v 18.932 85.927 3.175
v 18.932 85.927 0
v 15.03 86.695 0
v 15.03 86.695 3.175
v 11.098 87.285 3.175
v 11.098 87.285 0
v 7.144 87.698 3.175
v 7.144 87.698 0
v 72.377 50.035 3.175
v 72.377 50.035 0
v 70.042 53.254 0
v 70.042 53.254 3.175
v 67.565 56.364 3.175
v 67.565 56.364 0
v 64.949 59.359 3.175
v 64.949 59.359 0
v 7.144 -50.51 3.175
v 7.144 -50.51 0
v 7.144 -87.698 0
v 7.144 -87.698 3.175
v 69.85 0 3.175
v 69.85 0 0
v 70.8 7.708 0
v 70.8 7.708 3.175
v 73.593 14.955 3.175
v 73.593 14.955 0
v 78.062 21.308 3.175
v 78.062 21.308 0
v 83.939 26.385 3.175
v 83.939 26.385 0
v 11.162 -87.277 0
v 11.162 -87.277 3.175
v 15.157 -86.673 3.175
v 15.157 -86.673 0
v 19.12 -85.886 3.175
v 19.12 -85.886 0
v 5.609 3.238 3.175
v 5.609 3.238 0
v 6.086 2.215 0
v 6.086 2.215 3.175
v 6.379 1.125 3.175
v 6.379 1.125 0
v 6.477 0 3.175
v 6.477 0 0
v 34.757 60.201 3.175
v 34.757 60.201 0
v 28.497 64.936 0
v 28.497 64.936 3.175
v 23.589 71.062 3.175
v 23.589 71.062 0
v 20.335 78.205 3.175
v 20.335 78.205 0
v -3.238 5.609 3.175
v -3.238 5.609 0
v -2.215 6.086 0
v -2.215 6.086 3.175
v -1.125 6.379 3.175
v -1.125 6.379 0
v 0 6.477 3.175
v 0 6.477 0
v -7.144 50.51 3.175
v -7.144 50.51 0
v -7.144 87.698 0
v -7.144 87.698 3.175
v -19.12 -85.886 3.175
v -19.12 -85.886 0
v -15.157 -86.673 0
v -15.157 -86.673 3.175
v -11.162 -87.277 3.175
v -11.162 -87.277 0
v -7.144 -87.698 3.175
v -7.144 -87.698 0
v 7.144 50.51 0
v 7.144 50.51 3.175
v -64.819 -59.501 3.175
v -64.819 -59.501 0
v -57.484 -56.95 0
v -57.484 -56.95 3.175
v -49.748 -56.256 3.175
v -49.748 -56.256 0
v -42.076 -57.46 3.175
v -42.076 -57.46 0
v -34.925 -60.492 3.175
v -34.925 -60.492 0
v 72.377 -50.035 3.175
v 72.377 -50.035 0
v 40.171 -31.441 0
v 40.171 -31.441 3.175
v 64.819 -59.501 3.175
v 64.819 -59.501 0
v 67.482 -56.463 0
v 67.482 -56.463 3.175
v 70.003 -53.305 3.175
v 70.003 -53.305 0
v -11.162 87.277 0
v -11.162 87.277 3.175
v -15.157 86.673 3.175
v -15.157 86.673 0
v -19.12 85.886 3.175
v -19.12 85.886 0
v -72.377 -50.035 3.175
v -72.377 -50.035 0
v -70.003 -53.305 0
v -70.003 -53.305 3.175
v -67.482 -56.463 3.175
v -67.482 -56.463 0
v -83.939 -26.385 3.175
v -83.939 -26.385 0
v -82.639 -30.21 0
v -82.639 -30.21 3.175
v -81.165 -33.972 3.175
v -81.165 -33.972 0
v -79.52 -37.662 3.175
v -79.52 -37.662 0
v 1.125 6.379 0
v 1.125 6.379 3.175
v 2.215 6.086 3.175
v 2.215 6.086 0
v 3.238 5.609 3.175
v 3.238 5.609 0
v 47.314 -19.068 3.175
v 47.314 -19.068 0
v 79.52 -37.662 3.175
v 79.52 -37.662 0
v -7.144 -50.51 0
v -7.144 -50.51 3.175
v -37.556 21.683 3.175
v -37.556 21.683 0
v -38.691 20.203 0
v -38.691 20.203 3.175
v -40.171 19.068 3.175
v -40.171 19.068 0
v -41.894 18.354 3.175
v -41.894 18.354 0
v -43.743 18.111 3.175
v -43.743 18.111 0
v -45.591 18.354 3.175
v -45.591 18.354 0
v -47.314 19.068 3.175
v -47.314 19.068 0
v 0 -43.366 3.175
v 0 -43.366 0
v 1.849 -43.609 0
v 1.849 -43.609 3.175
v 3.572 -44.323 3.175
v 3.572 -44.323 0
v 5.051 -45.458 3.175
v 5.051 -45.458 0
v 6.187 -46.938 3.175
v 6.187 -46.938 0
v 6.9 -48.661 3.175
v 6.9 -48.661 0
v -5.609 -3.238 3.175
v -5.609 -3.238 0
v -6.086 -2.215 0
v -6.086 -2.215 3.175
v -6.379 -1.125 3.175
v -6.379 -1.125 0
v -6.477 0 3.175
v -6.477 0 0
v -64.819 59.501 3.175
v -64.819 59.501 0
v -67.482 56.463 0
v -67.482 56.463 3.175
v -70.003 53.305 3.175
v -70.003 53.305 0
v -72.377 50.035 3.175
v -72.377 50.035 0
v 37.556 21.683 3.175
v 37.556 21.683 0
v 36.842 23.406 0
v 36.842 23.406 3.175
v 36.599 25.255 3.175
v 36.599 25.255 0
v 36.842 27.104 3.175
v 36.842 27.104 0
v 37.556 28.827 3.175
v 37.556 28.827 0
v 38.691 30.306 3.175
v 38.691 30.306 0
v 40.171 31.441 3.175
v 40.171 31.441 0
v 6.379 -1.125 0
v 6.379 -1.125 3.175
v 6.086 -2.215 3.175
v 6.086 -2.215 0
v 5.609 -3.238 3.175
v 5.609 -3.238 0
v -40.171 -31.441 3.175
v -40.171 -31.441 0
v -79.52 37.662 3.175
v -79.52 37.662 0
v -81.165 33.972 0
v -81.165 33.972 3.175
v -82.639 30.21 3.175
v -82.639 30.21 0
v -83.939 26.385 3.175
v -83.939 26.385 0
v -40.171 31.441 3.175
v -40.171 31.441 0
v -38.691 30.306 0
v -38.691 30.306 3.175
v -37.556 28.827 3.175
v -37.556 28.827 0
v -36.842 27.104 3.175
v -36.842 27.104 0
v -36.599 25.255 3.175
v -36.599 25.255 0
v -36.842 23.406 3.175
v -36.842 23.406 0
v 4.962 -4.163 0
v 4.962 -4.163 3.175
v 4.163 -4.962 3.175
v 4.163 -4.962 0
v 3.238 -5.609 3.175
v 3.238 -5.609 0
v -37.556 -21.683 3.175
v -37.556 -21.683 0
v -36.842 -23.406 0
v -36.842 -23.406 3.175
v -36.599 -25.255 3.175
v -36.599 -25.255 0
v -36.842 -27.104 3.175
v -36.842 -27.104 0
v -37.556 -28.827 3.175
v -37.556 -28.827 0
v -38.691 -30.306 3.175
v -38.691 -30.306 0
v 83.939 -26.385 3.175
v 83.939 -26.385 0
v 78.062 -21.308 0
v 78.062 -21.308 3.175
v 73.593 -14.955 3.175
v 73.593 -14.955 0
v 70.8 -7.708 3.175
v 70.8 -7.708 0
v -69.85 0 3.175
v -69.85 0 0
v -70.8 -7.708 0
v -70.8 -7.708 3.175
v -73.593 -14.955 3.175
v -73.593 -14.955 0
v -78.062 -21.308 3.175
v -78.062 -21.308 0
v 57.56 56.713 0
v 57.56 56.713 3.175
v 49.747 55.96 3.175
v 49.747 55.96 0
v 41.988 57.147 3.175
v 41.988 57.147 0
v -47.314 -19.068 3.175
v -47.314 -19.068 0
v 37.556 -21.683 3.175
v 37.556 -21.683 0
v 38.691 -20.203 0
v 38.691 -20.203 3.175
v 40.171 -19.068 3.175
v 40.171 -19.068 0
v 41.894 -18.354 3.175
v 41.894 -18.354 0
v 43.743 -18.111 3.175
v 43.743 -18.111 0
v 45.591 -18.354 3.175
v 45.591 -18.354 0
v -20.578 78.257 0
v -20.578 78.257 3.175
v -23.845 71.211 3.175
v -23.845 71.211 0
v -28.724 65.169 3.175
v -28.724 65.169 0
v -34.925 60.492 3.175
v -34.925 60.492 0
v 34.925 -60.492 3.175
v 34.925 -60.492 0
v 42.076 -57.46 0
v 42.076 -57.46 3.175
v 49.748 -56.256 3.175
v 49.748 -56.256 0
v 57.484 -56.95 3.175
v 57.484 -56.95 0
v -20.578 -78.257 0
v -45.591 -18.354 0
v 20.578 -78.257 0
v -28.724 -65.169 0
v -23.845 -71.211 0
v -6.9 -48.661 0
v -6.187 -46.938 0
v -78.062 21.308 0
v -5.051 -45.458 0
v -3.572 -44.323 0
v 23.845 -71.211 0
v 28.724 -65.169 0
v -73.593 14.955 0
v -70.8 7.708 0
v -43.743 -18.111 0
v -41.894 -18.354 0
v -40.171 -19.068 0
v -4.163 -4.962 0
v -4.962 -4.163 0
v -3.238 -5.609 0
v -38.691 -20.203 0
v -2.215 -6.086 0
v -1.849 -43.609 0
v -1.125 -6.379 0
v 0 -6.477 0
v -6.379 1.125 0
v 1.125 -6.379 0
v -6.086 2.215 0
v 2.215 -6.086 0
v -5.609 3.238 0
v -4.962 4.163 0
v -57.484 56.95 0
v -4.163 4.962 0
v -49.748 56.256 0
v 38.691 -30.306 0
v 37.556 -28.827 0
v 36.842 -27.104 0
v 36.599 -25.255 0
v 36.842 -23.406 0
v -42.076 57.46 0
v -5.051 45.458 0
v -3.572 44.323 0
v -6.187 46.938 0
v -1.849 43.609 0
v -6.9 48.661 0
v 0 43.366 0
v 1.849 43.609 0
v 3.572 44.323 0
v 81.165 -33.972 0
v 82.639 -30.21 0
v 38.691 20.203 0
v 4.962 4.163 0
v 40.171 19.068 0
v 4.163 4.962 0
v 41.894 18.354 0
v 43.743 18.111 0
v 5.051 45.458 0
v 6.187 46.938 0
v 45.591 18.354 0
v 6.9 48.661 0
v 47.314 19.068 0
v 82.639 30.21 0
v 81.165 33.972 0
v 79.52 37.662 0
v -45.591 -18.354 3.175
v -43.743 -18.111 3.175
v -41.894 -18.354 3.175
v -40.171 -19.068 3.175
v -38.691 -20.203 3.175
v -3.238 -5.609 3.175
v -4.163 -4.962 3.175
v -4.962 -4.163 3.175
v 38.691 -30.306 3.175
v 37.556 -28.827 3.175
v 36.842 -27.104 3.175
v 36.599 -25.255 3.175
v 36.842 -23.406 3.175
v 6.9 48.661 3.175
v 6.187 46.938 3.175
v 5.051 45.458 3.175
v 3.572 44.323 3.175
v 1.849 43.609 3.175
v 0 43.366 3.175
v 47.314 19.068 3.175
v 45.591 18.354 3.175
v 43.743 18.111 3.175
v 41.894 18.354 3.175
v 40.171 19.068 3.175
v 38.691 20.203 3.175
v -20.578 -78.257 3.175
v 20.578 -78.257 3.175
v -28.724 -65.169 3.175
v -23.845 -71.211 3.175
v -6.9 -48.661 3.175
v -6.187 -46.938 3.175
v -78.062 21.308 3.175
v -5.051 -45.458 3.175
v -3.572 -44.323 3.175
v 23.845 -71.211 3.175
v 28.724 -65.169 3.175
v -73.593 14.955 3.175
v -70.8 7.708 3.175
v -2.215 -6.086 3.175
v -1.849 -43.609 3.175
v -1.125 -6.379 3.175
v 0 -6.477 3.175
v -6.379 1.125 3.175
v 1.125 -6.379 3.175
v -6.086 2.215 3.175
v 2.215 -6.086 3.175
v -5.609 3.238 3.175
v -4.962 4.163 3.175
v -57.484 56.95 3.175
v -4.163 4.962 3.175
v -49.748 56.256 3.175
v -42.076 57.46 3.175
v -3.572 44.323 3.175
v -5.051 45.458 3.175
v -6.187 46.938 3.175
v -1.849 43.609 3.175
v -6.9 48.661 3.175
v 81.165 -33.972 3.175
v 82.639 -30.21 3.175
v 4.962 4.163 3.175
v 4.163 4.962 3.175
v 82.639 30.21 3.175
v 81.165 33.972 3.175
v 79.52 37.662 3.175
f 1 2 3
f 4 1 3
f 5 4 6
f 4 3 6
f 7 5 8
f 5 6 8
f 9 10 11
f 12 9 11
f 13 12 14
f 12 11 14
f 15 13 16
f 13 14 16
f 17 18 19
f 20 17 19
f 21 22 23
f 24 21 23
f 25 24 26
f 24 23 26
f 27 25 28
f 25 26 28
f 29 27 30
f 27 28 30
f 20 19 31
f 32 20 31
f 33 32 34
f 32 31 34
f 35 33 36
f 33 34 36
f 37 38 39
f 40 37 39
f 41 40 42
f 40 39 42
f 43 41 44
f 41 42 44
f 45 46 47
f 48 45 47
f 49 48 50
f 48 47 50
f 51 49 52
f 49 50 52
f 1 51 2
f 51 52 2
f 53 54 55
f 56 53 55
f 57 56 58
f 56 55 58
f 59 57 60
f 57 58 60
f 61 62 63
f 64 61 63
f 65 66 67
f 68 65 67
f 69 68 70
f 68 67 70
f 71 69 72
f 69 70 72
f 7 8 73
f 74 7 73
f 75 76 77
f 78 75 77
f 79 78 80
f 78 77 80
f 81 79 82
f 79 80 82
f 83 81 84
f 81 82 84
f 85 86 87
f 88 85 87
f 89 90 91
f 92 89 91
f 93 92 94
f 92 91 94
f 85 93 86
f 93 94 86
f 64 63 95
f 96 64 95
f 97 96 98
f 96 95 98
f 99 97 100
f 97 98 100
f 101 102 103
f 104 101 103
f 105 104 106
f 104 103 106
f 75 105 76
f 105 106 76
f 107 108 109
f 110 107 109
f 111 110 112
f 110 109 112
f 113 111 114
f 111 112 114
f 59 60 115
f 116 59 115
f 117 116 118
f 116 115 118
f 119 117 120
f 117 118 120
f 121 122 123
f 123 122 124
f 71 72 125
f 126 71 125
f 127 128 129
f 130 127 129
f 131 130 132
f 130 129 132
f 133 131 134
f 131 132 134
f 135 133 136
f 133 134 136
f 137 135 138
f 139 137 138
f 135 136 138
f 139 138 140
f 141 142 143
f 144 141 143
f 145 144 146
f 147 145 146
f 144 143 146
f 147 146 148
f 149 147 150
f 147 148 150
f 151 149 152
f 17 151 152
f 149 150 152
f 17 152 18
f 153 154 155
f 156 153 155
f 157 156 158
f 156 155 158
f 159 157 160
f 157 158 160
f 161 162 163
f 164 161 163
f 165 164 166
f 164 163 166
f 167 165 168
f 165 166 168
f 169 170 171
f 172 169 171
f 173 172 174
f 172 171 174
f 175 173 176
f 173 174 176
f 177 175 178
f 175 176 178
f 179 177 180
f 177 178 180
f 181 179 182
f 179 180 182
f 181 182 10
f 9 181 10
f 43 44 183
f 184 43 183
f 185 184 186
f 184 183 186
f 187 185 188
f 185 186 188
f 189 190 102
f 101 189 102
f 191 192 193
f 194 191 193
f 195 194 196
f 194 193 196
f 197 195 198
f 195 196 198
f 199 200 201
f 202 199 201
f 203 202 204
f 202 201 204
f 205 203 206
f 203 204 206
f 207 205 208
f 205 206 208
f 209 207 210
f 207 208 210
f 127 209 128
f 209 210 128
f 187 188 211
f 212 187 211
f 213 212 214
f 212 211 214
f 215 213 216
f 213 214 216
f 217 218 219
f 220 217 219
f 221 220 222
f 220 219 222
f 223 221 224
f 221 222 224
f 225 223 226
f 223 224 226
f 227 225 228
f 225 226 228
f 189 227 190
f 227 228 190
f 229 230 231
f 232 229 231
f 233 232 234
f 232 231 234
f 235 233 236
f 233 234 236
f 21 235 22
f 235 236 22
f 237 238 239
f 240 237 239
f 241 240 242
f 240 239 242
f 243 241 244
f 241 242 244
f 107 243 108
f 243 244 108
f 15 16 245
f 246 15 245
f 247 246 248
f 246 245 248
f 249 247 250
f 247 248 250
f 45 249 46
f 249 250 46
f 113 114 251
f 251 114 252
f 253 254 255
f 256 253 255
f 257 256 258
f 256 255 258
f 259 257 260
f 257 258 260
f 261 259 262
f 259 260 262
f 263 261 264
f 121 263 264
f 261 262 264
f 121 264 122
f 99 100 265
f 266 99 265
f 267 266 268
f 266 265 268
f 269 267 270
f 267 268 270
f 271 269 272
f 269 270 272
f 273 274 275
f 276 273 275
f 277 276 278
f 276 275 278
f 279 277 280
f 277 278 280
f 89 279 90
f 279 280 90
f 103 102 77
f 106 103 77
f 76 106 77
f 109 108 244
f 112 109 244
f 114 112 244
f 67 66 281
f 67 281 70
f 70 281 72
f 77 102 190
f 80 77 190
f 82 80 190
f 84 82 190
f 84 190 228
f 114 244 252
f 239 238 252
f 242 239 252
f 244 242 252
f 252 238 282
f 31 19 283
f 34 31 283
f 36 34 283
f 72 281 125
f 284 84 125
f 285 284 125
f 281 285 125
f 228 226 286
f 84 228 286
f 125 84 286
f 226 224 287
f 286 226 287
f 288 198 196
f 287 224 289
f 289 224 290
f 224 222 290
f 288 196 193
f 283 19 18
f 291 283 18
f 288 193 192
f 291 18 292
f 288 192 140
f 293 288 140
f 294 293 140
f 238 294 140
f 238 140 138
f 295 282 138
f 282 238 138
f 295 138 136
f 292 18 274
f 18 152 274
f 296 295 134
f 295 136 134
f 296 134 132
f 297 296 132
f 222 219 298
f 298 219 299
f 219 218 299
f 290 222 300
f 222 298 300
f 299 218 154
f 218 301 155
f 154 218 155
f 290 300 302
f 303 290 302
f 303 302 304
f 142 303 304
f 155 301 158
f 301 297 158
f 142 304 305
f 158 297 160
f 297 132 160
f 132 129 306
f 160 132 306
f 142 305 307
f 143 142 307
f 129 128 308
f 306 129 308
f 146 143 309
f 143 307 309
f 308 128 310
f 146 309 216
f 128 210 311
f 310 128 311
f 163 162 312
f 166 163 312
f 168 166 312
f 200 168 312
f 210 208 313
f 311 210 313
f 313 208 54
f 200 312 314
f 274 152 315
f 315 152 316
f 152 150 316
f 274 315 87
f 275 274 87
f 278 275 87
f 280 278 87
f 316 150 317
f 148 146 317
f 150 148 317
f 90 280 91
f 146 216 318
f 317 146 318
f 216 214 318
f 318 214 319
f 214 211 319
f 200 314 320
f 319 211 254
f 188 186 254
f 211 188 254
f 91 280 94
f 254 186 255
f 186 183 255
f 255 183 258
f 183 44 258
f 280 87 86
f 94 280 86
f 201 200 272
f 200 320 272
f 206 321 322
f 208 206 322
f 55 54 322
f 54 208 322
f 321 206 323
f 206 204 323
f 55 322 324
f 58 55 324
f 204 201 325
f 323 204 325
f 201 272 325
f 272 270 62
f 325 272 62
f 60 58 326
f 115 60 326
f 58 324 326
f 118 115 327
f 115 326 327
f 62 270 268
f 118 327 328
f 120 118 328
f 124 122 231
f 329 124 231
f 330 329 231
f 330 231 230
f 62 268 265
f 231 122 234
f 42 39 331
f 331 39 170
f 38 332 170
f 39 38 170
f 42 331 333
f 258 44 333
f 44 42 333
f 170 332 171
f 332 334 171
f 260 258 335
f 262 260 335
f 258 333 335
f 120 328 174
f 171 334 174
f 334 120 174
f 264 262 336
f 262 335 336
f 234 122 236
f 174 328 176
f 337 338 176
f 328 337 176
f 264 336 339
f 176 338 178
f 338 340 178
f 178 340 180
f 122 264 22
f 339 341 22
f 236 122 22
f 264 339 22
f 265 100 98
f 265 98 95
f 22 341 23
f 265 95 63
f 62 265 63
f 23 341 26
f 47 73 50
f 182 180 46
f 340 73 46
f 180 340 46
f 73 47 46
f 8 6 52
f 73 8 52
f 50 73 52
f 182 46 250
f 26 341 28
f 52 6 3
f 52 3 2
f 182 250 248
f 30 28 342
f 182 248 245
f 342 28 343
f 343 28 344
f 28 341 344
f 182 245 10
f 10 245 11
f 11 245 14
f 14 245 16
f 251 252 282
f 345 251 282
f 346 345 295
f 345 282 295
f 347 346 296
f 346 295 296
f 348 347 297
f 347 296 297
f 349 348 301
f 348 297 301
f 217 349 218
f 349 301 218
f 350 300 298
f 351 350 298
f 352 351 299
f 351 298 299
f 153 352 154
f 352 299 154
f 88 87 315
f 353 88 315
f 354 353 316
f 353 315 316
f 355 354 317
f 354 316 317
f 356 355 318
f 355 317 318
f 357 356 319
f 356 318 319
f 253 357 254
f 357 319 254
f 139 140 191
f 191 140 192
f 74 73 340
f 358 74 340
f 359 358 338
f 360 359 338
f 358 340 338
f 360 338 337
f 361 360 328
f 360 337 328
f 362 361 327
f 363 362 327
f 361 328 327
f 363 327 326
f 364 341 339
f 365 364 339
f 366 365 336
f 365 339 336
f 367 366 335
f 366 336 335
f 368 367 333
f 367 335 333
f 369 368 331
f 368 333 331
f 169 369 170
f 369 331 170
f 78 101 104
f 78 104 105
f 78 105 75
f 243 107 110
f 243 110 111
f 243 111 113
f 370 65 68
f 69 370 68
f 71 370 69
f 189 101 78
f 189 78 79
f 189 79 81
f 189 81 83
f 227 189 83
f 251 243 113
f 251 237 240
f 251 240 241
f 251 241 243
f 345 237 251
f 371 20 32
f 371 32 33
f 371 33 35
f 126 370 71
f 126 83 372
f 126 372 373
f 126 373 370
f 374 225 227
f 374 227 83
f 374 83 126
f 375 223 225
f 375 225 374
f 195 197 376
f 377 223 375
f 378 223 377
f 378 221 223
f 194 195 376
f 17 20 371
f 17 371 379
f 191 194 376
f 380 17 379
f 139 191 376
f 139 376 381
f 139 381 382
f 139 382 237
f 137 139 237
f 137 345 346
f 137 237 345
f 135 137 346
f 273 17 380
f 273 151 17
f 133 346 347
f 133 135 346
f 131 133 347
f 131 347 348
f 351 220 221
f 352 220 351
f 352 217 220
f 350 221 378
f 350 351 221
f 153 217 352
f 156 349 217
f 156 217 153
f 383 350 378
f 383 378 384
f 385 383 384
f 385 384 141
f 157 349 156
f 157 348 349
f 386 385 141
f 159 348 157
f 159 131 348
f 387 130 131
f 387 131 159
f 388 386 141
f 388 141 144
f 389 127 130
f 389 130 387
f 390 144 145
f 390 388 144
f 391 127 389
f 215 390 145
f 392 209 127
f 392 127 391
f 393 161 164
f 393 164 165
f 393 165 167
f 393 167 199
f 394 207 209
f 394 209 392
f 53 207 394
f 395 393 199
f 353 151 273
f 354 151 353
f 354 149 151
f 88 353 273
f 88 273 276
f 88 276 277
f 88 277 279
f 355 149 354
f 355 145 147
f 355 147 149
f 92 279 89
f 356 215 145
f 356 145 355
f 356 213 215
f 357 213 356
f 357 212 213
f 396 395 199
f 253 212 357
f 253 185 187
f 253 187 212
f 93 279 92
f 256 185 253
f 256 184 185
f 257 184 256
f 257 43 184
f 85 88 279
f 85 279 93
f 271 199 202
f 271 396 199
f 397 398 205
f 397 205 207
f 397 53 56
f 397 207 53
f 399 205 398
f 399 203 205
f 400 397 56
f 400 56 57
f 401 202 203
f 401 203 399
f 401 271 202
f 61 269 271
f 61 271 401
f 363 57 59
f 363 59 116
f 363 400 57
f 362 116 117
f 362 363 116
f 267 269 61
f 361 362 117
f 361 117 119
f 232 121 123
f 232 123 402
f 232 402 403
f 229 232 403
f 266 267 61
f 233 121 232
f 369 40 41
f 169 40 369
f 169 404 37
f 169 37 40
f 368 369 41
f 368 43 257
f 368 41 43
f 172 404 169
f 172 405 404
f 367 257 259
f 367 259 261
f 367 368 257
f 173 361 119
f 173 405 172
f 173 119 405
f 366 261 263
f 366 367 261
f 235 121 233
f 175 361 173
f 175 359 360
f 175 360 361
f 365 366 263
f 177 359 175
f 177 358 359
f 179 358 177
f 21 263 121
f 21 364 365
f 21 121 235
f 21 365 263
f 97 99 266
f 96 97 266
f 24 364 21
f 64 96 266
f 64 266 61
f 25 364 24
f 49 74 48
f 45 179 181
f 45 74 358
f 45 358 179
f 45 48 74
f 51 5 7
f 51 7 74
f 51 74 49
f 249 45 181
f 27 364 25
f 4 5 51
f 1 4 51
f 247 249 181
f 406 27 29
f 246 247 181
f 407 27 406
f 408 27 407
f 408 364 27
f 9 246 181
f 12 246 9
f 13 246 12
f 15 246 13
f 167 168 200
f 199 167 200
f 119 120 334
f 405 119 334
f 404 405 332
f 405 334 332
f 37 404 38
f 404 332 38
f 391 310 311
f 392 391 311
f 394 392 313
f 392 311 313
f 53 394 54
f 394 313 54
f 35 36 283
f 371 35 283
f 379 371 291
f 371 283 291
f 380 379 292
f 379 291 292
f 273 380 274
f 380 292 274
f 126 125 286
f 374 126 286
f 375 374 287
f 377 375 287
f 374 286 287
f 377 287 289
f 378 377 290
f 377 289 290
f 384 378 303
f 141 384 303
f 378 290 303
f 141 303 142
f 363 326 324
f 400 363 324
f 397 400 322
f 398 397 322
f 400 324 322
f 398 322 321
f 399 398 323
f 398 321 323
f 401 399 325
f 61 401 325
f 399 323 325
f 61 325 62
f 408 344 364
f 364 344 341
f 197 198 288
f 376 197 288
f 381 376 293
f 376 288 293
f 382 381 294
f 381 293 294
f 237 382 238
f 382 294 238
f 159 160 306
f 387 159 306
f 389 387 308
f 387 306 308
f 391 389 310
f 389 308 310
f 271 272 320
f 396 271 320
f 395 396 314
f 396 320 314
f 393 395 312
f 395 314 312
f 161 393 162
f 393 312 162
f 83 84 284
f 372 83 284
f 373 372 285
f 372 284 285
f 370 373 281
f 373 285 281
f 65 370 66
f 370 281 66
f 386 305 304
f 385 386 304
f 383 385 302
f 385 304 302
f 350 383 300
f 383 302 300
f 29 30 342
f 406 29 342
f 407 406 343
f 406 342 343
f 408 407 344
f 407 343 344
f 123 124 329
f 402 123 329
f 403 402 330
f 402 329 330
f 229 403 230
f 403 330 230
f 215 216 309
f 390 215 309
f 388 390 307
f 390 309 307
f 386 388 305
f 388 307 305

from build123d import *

# Parameters (mm, degrees)
F1_DEPTH = 3.175


with BuildPart() as f1:
    # F0 (on Top) → F1 (new body)
    with BuildSketch(Plane.XY):
        with BuildLine():
            Line((0, 6.477), (0, 43.36577))
            ThreePointArc((0, 43.36577), (-5.051394, 45.458126), (-7.14375, 50.50952))
            Line((-7.14375, 50.50952), (-7.14375, 87.69766))
            ThreePointArc((-7.14375, 87.69766), (-13.162923, 86.99799), (-19.119664, 85.885687))
            ThreePointArc((-19.119664, 85.885687), (-23.844664, 71.210965), (-34.924976, 60.491833))
            Line((-34.924976, 60.491833), (-3.2385, 5.609247))
            ThreePointArc((-3.2385, 5.609247), (-1.676371, 6.256302), (0, 6.477))
        make_face()
        with BuildLine():
            ThreePointArc((-5.609247, 3.2385), (-4.579931, 4.579931), (-3.2385, 5.609247))
            Line((-3.2385, 5.609247), (-34.924976, 60.491833))
            ThreePointArc((-34.924976, 60.491833), (-49.748173, 56.255567), (-64.819355, 59.500958))
            ThreePointArc((-64.819355, 59.500958), (-68.761008, 54.898421), (-72.376527, 50.035499))
            Line((-72.376527, 50.035499), (-40.170653, 31.441429))
            ThreePointArc((-40.170653, 31.441429), (-36.842195, 27.103699), (-37.555859, 21.682885))
            Line((-37.555859, 21.682885), (-5.609247, 3.2385))
        make_face()
        with BuildLine():
            ThreePointArc((-6.477, 0), (-6.256302, 1.676371), (-5.609247, 3.2385))
            Line((-5.609247, 3.2385), (-37.555859, 21.682885))
            ThreePointArc((-37.555859, 21.682885), (-41.893589, 18.354428), (-47.314403, 19.068091))
            Line((-47.314403, 19.068091), (-79.520277, 37.662161))
            ThreePointArc((-79.520277, 37.662161), (-81.923931, 32.099569), (-83.939019, 26.384729))
            ThreePointArc((-83.939019, 26.384729), (-73.592836, 14.955398), (-69.849953, 0))
            Line((-69.849953, 0), (-6.477, 0))
        make_face()
        with BuildLine():
            ThreePointArc((-5.609247, -3.2385), (-6.256302, -1.676371), (-6.477, 0))
            Line((-6.477, 0), (-69.849953, 0))
            ThreePointArc((-69.849953, 0), (-73.592836, -14.955398), (-83.939019, -26.384729))
            ThreePointArc((-83.939019, -26.384729), (-81.923931, -32.099569), (-79.520277, -37.662161))
            Line((-79.520277, -37.662161), (-47.314403, -19.068091))
            ThreePointArc((-47.314403, -19.068091), (-41.893589, -18.354428), (-37.555859, -21.682885))
            Line((-37.555859, -21.682885), (-5.609247, -3.2385))
        make_face()
        with BuildLine():
            ThreePointArc((-3.2385, -5.609247), (-4.579931, -4.579931), (-5.609247, -3.2385))
            Line((-5.609247, -3.2385), (-37.555859, -21.682885))
            ThreePointArc((-37.555859, -21.682885), (-36.842195, -27.103699), (-40.170653, -31.441429))
            Line((-40.170653, -31.441429), (-72.376527, -50.035499))
            ThreePointArc((-72.376527, -50.035499), (-68.761008, -54.898421), (-64.819355, -59.500958))
            ThreePointArc((-64.819355, -59.500958), (-49.748173, -56.255567), (-34.924976, -60.491833))
            Line((-34.924976, -60.491833), (-3.2385, -5.609247))
        make_face()
        with BuildLine():
            Line((0, -43.36577), (0, -6.477))
            ThreePointArc((0, -6.477), (-1.676371, -6.256302), (-3.2385, -5.609247))
            Line((-3.2385, -5.609247), (-34.924976, -60.491833))
            ThreePointArc((-34.924976, -60.491833), (-23.844664, -71.210965), (-19.119664, -85.885687))
            ThreePointArc((-19.119664, -85.885687), (-13.162923, -86.99799), (-7.14375, -87.69766))
            Line((-7.14375, -87.69766), (-7.14375, -50.50952))
            ThreePointArc((-7.14375, -50.50952), (-5.051394, -45.458126), (0, -43.36577))
        make_face()
        with BuildLine():
            Line((34.924976, -60.491833), (3.2385, -5.609247))
            ThreePointArc((3.2385, -5.609247), (1.676371, -6.256302), (0, -6.477))
            Line((0, -6.477), (0, -43.36577))
            ThreePointArc((0, -43.36577), (5.051394, -45.458126), (7.14375, -50.50952))
            Line((7.14375, -50.50952), (7.14375, -87.69766))
            ThreePointArc((7.14375, -87.69766), (13.162923, -86.99799), (19.119664, -85.885687))
            ThreePointArc((19.119664, -85.885687), (23.844664, -71.210965), (34.924976, -60.491833))
        make_face()
        with BuildLine():
            Line((37.555859, -21.682885), (5.609247, -3.2385))
            ThreePointArc((5.609247, -3.2385), (4.579931, -4.579931), (3.2385, -5.609247))
            Line((3.2385, -5.609247), (34.924976, -60.491833))
            ThreePointArc((34.924976, -60.491833), (49.748173, -56.255567), (64.819355, -59.500958))
            ThreePointArc((64.819355, -59.500958), (68.761008, -54.898421), (72.376527, -50.035499))
            Line((72.376527, -50.035499), (40.170653, -31.441429))
            ThreePointArc((40.170653, -31.441429), (36.842195, -27.103699), (37.555859, -21.682885))
        make_face()
        with BuildLine():
            Line((69.849953, 0), (6.477, 0))
            ThreePointArc((6.477, 0), (6.256302, -1.676371), (5.609247, -3.2385))
            Line((5.609247, -3.2385), (37.555859, -21.682885))
            ThreePointArc((37.555859, -21.682885), (41.893589, -18.354428), (47.314403, -19.068091))
            Line((47.314403, -19.068091), (79.520277, -37.662161))
            ThreePointArc((79.520277, -37.662161), (81.923931, -32.099569), (83.939019, -26.384729))
            ThreePointArc((83.939019, -26.384729), (73.592836, -14.955398), (69.849953, 0))
        make_face()
        with BuildLine():
            Line((37.555859, 21.682885), (5.609247, 3.2385))
            ThreePointArc((5.609247, 3.2385), (6.256302, 1.676371), (6.477, 0))
            Line((6.477, 0), (69.849953, 0))
            ThreePointArc((69.849953, 0), (73.592836, 14.955398), (83.939019, 26.384729))
            ThreePointArc((83.939019, 26.384729), (81.923931, 32.099569), (79.520277, 37.662161))
            Line((79.520277, 37.662161), (47.314403, 19.068091))
            ThreePointArc((47.314403, 19.068091), (41.893589, 18.354428), (37.555859, 21.682885))
        make_face()
        with BuildLine():
            ThreePointArc((64.949414, 59.358962), (49.746755, 55.960011), (34.757268, 60.201354))
            Line((34.757268, 60.201354), (3.2385, 5.609247))
            ThreePointArc((3.2385, 5.609247), (4.579931, 4.579931), (5.609247, 3.2385))
            Line((5.609247, 3.2385), (37.555859, 21.682885))
            ThreePointArc((37.555859, 21.682885), (36.842195, 27.103699), (40.170653, 31.441429))
            Line((40.170653, 31.441429), (72.376527, 50.035499))
            ThreePointArc((72.376527, 50.035499), (68.821038, 54.823148), (64.949414, 59.358962))
        make_face()
        with BuildLine():
            ThreePointArc((34.757268, 60.201354), (23.589414, 71.061959), (18.931662, 85.927324))
            ThreePointArc((18.931662, 85.927324), (13.06772, 87.012341), (7.14375, 87.69766))
            Line((7.14375, 87.69766), (7.14375, 50.50952))
            ThreePointArc((7.14375, 50.50952), (5.051394, 45.458126), (0, 43.36577))
            Line((0, 43.36577), (0, 6.477))
            ThreePointArc((0, 6.477), (1.676371, 6.256302), (3.2385, 5.609247))
            Line((3.2385, 5.609247), (34.757268, 60.201354))
        make_face()
    extrude(amount=F1_DEPTH)


solid = f1.part
